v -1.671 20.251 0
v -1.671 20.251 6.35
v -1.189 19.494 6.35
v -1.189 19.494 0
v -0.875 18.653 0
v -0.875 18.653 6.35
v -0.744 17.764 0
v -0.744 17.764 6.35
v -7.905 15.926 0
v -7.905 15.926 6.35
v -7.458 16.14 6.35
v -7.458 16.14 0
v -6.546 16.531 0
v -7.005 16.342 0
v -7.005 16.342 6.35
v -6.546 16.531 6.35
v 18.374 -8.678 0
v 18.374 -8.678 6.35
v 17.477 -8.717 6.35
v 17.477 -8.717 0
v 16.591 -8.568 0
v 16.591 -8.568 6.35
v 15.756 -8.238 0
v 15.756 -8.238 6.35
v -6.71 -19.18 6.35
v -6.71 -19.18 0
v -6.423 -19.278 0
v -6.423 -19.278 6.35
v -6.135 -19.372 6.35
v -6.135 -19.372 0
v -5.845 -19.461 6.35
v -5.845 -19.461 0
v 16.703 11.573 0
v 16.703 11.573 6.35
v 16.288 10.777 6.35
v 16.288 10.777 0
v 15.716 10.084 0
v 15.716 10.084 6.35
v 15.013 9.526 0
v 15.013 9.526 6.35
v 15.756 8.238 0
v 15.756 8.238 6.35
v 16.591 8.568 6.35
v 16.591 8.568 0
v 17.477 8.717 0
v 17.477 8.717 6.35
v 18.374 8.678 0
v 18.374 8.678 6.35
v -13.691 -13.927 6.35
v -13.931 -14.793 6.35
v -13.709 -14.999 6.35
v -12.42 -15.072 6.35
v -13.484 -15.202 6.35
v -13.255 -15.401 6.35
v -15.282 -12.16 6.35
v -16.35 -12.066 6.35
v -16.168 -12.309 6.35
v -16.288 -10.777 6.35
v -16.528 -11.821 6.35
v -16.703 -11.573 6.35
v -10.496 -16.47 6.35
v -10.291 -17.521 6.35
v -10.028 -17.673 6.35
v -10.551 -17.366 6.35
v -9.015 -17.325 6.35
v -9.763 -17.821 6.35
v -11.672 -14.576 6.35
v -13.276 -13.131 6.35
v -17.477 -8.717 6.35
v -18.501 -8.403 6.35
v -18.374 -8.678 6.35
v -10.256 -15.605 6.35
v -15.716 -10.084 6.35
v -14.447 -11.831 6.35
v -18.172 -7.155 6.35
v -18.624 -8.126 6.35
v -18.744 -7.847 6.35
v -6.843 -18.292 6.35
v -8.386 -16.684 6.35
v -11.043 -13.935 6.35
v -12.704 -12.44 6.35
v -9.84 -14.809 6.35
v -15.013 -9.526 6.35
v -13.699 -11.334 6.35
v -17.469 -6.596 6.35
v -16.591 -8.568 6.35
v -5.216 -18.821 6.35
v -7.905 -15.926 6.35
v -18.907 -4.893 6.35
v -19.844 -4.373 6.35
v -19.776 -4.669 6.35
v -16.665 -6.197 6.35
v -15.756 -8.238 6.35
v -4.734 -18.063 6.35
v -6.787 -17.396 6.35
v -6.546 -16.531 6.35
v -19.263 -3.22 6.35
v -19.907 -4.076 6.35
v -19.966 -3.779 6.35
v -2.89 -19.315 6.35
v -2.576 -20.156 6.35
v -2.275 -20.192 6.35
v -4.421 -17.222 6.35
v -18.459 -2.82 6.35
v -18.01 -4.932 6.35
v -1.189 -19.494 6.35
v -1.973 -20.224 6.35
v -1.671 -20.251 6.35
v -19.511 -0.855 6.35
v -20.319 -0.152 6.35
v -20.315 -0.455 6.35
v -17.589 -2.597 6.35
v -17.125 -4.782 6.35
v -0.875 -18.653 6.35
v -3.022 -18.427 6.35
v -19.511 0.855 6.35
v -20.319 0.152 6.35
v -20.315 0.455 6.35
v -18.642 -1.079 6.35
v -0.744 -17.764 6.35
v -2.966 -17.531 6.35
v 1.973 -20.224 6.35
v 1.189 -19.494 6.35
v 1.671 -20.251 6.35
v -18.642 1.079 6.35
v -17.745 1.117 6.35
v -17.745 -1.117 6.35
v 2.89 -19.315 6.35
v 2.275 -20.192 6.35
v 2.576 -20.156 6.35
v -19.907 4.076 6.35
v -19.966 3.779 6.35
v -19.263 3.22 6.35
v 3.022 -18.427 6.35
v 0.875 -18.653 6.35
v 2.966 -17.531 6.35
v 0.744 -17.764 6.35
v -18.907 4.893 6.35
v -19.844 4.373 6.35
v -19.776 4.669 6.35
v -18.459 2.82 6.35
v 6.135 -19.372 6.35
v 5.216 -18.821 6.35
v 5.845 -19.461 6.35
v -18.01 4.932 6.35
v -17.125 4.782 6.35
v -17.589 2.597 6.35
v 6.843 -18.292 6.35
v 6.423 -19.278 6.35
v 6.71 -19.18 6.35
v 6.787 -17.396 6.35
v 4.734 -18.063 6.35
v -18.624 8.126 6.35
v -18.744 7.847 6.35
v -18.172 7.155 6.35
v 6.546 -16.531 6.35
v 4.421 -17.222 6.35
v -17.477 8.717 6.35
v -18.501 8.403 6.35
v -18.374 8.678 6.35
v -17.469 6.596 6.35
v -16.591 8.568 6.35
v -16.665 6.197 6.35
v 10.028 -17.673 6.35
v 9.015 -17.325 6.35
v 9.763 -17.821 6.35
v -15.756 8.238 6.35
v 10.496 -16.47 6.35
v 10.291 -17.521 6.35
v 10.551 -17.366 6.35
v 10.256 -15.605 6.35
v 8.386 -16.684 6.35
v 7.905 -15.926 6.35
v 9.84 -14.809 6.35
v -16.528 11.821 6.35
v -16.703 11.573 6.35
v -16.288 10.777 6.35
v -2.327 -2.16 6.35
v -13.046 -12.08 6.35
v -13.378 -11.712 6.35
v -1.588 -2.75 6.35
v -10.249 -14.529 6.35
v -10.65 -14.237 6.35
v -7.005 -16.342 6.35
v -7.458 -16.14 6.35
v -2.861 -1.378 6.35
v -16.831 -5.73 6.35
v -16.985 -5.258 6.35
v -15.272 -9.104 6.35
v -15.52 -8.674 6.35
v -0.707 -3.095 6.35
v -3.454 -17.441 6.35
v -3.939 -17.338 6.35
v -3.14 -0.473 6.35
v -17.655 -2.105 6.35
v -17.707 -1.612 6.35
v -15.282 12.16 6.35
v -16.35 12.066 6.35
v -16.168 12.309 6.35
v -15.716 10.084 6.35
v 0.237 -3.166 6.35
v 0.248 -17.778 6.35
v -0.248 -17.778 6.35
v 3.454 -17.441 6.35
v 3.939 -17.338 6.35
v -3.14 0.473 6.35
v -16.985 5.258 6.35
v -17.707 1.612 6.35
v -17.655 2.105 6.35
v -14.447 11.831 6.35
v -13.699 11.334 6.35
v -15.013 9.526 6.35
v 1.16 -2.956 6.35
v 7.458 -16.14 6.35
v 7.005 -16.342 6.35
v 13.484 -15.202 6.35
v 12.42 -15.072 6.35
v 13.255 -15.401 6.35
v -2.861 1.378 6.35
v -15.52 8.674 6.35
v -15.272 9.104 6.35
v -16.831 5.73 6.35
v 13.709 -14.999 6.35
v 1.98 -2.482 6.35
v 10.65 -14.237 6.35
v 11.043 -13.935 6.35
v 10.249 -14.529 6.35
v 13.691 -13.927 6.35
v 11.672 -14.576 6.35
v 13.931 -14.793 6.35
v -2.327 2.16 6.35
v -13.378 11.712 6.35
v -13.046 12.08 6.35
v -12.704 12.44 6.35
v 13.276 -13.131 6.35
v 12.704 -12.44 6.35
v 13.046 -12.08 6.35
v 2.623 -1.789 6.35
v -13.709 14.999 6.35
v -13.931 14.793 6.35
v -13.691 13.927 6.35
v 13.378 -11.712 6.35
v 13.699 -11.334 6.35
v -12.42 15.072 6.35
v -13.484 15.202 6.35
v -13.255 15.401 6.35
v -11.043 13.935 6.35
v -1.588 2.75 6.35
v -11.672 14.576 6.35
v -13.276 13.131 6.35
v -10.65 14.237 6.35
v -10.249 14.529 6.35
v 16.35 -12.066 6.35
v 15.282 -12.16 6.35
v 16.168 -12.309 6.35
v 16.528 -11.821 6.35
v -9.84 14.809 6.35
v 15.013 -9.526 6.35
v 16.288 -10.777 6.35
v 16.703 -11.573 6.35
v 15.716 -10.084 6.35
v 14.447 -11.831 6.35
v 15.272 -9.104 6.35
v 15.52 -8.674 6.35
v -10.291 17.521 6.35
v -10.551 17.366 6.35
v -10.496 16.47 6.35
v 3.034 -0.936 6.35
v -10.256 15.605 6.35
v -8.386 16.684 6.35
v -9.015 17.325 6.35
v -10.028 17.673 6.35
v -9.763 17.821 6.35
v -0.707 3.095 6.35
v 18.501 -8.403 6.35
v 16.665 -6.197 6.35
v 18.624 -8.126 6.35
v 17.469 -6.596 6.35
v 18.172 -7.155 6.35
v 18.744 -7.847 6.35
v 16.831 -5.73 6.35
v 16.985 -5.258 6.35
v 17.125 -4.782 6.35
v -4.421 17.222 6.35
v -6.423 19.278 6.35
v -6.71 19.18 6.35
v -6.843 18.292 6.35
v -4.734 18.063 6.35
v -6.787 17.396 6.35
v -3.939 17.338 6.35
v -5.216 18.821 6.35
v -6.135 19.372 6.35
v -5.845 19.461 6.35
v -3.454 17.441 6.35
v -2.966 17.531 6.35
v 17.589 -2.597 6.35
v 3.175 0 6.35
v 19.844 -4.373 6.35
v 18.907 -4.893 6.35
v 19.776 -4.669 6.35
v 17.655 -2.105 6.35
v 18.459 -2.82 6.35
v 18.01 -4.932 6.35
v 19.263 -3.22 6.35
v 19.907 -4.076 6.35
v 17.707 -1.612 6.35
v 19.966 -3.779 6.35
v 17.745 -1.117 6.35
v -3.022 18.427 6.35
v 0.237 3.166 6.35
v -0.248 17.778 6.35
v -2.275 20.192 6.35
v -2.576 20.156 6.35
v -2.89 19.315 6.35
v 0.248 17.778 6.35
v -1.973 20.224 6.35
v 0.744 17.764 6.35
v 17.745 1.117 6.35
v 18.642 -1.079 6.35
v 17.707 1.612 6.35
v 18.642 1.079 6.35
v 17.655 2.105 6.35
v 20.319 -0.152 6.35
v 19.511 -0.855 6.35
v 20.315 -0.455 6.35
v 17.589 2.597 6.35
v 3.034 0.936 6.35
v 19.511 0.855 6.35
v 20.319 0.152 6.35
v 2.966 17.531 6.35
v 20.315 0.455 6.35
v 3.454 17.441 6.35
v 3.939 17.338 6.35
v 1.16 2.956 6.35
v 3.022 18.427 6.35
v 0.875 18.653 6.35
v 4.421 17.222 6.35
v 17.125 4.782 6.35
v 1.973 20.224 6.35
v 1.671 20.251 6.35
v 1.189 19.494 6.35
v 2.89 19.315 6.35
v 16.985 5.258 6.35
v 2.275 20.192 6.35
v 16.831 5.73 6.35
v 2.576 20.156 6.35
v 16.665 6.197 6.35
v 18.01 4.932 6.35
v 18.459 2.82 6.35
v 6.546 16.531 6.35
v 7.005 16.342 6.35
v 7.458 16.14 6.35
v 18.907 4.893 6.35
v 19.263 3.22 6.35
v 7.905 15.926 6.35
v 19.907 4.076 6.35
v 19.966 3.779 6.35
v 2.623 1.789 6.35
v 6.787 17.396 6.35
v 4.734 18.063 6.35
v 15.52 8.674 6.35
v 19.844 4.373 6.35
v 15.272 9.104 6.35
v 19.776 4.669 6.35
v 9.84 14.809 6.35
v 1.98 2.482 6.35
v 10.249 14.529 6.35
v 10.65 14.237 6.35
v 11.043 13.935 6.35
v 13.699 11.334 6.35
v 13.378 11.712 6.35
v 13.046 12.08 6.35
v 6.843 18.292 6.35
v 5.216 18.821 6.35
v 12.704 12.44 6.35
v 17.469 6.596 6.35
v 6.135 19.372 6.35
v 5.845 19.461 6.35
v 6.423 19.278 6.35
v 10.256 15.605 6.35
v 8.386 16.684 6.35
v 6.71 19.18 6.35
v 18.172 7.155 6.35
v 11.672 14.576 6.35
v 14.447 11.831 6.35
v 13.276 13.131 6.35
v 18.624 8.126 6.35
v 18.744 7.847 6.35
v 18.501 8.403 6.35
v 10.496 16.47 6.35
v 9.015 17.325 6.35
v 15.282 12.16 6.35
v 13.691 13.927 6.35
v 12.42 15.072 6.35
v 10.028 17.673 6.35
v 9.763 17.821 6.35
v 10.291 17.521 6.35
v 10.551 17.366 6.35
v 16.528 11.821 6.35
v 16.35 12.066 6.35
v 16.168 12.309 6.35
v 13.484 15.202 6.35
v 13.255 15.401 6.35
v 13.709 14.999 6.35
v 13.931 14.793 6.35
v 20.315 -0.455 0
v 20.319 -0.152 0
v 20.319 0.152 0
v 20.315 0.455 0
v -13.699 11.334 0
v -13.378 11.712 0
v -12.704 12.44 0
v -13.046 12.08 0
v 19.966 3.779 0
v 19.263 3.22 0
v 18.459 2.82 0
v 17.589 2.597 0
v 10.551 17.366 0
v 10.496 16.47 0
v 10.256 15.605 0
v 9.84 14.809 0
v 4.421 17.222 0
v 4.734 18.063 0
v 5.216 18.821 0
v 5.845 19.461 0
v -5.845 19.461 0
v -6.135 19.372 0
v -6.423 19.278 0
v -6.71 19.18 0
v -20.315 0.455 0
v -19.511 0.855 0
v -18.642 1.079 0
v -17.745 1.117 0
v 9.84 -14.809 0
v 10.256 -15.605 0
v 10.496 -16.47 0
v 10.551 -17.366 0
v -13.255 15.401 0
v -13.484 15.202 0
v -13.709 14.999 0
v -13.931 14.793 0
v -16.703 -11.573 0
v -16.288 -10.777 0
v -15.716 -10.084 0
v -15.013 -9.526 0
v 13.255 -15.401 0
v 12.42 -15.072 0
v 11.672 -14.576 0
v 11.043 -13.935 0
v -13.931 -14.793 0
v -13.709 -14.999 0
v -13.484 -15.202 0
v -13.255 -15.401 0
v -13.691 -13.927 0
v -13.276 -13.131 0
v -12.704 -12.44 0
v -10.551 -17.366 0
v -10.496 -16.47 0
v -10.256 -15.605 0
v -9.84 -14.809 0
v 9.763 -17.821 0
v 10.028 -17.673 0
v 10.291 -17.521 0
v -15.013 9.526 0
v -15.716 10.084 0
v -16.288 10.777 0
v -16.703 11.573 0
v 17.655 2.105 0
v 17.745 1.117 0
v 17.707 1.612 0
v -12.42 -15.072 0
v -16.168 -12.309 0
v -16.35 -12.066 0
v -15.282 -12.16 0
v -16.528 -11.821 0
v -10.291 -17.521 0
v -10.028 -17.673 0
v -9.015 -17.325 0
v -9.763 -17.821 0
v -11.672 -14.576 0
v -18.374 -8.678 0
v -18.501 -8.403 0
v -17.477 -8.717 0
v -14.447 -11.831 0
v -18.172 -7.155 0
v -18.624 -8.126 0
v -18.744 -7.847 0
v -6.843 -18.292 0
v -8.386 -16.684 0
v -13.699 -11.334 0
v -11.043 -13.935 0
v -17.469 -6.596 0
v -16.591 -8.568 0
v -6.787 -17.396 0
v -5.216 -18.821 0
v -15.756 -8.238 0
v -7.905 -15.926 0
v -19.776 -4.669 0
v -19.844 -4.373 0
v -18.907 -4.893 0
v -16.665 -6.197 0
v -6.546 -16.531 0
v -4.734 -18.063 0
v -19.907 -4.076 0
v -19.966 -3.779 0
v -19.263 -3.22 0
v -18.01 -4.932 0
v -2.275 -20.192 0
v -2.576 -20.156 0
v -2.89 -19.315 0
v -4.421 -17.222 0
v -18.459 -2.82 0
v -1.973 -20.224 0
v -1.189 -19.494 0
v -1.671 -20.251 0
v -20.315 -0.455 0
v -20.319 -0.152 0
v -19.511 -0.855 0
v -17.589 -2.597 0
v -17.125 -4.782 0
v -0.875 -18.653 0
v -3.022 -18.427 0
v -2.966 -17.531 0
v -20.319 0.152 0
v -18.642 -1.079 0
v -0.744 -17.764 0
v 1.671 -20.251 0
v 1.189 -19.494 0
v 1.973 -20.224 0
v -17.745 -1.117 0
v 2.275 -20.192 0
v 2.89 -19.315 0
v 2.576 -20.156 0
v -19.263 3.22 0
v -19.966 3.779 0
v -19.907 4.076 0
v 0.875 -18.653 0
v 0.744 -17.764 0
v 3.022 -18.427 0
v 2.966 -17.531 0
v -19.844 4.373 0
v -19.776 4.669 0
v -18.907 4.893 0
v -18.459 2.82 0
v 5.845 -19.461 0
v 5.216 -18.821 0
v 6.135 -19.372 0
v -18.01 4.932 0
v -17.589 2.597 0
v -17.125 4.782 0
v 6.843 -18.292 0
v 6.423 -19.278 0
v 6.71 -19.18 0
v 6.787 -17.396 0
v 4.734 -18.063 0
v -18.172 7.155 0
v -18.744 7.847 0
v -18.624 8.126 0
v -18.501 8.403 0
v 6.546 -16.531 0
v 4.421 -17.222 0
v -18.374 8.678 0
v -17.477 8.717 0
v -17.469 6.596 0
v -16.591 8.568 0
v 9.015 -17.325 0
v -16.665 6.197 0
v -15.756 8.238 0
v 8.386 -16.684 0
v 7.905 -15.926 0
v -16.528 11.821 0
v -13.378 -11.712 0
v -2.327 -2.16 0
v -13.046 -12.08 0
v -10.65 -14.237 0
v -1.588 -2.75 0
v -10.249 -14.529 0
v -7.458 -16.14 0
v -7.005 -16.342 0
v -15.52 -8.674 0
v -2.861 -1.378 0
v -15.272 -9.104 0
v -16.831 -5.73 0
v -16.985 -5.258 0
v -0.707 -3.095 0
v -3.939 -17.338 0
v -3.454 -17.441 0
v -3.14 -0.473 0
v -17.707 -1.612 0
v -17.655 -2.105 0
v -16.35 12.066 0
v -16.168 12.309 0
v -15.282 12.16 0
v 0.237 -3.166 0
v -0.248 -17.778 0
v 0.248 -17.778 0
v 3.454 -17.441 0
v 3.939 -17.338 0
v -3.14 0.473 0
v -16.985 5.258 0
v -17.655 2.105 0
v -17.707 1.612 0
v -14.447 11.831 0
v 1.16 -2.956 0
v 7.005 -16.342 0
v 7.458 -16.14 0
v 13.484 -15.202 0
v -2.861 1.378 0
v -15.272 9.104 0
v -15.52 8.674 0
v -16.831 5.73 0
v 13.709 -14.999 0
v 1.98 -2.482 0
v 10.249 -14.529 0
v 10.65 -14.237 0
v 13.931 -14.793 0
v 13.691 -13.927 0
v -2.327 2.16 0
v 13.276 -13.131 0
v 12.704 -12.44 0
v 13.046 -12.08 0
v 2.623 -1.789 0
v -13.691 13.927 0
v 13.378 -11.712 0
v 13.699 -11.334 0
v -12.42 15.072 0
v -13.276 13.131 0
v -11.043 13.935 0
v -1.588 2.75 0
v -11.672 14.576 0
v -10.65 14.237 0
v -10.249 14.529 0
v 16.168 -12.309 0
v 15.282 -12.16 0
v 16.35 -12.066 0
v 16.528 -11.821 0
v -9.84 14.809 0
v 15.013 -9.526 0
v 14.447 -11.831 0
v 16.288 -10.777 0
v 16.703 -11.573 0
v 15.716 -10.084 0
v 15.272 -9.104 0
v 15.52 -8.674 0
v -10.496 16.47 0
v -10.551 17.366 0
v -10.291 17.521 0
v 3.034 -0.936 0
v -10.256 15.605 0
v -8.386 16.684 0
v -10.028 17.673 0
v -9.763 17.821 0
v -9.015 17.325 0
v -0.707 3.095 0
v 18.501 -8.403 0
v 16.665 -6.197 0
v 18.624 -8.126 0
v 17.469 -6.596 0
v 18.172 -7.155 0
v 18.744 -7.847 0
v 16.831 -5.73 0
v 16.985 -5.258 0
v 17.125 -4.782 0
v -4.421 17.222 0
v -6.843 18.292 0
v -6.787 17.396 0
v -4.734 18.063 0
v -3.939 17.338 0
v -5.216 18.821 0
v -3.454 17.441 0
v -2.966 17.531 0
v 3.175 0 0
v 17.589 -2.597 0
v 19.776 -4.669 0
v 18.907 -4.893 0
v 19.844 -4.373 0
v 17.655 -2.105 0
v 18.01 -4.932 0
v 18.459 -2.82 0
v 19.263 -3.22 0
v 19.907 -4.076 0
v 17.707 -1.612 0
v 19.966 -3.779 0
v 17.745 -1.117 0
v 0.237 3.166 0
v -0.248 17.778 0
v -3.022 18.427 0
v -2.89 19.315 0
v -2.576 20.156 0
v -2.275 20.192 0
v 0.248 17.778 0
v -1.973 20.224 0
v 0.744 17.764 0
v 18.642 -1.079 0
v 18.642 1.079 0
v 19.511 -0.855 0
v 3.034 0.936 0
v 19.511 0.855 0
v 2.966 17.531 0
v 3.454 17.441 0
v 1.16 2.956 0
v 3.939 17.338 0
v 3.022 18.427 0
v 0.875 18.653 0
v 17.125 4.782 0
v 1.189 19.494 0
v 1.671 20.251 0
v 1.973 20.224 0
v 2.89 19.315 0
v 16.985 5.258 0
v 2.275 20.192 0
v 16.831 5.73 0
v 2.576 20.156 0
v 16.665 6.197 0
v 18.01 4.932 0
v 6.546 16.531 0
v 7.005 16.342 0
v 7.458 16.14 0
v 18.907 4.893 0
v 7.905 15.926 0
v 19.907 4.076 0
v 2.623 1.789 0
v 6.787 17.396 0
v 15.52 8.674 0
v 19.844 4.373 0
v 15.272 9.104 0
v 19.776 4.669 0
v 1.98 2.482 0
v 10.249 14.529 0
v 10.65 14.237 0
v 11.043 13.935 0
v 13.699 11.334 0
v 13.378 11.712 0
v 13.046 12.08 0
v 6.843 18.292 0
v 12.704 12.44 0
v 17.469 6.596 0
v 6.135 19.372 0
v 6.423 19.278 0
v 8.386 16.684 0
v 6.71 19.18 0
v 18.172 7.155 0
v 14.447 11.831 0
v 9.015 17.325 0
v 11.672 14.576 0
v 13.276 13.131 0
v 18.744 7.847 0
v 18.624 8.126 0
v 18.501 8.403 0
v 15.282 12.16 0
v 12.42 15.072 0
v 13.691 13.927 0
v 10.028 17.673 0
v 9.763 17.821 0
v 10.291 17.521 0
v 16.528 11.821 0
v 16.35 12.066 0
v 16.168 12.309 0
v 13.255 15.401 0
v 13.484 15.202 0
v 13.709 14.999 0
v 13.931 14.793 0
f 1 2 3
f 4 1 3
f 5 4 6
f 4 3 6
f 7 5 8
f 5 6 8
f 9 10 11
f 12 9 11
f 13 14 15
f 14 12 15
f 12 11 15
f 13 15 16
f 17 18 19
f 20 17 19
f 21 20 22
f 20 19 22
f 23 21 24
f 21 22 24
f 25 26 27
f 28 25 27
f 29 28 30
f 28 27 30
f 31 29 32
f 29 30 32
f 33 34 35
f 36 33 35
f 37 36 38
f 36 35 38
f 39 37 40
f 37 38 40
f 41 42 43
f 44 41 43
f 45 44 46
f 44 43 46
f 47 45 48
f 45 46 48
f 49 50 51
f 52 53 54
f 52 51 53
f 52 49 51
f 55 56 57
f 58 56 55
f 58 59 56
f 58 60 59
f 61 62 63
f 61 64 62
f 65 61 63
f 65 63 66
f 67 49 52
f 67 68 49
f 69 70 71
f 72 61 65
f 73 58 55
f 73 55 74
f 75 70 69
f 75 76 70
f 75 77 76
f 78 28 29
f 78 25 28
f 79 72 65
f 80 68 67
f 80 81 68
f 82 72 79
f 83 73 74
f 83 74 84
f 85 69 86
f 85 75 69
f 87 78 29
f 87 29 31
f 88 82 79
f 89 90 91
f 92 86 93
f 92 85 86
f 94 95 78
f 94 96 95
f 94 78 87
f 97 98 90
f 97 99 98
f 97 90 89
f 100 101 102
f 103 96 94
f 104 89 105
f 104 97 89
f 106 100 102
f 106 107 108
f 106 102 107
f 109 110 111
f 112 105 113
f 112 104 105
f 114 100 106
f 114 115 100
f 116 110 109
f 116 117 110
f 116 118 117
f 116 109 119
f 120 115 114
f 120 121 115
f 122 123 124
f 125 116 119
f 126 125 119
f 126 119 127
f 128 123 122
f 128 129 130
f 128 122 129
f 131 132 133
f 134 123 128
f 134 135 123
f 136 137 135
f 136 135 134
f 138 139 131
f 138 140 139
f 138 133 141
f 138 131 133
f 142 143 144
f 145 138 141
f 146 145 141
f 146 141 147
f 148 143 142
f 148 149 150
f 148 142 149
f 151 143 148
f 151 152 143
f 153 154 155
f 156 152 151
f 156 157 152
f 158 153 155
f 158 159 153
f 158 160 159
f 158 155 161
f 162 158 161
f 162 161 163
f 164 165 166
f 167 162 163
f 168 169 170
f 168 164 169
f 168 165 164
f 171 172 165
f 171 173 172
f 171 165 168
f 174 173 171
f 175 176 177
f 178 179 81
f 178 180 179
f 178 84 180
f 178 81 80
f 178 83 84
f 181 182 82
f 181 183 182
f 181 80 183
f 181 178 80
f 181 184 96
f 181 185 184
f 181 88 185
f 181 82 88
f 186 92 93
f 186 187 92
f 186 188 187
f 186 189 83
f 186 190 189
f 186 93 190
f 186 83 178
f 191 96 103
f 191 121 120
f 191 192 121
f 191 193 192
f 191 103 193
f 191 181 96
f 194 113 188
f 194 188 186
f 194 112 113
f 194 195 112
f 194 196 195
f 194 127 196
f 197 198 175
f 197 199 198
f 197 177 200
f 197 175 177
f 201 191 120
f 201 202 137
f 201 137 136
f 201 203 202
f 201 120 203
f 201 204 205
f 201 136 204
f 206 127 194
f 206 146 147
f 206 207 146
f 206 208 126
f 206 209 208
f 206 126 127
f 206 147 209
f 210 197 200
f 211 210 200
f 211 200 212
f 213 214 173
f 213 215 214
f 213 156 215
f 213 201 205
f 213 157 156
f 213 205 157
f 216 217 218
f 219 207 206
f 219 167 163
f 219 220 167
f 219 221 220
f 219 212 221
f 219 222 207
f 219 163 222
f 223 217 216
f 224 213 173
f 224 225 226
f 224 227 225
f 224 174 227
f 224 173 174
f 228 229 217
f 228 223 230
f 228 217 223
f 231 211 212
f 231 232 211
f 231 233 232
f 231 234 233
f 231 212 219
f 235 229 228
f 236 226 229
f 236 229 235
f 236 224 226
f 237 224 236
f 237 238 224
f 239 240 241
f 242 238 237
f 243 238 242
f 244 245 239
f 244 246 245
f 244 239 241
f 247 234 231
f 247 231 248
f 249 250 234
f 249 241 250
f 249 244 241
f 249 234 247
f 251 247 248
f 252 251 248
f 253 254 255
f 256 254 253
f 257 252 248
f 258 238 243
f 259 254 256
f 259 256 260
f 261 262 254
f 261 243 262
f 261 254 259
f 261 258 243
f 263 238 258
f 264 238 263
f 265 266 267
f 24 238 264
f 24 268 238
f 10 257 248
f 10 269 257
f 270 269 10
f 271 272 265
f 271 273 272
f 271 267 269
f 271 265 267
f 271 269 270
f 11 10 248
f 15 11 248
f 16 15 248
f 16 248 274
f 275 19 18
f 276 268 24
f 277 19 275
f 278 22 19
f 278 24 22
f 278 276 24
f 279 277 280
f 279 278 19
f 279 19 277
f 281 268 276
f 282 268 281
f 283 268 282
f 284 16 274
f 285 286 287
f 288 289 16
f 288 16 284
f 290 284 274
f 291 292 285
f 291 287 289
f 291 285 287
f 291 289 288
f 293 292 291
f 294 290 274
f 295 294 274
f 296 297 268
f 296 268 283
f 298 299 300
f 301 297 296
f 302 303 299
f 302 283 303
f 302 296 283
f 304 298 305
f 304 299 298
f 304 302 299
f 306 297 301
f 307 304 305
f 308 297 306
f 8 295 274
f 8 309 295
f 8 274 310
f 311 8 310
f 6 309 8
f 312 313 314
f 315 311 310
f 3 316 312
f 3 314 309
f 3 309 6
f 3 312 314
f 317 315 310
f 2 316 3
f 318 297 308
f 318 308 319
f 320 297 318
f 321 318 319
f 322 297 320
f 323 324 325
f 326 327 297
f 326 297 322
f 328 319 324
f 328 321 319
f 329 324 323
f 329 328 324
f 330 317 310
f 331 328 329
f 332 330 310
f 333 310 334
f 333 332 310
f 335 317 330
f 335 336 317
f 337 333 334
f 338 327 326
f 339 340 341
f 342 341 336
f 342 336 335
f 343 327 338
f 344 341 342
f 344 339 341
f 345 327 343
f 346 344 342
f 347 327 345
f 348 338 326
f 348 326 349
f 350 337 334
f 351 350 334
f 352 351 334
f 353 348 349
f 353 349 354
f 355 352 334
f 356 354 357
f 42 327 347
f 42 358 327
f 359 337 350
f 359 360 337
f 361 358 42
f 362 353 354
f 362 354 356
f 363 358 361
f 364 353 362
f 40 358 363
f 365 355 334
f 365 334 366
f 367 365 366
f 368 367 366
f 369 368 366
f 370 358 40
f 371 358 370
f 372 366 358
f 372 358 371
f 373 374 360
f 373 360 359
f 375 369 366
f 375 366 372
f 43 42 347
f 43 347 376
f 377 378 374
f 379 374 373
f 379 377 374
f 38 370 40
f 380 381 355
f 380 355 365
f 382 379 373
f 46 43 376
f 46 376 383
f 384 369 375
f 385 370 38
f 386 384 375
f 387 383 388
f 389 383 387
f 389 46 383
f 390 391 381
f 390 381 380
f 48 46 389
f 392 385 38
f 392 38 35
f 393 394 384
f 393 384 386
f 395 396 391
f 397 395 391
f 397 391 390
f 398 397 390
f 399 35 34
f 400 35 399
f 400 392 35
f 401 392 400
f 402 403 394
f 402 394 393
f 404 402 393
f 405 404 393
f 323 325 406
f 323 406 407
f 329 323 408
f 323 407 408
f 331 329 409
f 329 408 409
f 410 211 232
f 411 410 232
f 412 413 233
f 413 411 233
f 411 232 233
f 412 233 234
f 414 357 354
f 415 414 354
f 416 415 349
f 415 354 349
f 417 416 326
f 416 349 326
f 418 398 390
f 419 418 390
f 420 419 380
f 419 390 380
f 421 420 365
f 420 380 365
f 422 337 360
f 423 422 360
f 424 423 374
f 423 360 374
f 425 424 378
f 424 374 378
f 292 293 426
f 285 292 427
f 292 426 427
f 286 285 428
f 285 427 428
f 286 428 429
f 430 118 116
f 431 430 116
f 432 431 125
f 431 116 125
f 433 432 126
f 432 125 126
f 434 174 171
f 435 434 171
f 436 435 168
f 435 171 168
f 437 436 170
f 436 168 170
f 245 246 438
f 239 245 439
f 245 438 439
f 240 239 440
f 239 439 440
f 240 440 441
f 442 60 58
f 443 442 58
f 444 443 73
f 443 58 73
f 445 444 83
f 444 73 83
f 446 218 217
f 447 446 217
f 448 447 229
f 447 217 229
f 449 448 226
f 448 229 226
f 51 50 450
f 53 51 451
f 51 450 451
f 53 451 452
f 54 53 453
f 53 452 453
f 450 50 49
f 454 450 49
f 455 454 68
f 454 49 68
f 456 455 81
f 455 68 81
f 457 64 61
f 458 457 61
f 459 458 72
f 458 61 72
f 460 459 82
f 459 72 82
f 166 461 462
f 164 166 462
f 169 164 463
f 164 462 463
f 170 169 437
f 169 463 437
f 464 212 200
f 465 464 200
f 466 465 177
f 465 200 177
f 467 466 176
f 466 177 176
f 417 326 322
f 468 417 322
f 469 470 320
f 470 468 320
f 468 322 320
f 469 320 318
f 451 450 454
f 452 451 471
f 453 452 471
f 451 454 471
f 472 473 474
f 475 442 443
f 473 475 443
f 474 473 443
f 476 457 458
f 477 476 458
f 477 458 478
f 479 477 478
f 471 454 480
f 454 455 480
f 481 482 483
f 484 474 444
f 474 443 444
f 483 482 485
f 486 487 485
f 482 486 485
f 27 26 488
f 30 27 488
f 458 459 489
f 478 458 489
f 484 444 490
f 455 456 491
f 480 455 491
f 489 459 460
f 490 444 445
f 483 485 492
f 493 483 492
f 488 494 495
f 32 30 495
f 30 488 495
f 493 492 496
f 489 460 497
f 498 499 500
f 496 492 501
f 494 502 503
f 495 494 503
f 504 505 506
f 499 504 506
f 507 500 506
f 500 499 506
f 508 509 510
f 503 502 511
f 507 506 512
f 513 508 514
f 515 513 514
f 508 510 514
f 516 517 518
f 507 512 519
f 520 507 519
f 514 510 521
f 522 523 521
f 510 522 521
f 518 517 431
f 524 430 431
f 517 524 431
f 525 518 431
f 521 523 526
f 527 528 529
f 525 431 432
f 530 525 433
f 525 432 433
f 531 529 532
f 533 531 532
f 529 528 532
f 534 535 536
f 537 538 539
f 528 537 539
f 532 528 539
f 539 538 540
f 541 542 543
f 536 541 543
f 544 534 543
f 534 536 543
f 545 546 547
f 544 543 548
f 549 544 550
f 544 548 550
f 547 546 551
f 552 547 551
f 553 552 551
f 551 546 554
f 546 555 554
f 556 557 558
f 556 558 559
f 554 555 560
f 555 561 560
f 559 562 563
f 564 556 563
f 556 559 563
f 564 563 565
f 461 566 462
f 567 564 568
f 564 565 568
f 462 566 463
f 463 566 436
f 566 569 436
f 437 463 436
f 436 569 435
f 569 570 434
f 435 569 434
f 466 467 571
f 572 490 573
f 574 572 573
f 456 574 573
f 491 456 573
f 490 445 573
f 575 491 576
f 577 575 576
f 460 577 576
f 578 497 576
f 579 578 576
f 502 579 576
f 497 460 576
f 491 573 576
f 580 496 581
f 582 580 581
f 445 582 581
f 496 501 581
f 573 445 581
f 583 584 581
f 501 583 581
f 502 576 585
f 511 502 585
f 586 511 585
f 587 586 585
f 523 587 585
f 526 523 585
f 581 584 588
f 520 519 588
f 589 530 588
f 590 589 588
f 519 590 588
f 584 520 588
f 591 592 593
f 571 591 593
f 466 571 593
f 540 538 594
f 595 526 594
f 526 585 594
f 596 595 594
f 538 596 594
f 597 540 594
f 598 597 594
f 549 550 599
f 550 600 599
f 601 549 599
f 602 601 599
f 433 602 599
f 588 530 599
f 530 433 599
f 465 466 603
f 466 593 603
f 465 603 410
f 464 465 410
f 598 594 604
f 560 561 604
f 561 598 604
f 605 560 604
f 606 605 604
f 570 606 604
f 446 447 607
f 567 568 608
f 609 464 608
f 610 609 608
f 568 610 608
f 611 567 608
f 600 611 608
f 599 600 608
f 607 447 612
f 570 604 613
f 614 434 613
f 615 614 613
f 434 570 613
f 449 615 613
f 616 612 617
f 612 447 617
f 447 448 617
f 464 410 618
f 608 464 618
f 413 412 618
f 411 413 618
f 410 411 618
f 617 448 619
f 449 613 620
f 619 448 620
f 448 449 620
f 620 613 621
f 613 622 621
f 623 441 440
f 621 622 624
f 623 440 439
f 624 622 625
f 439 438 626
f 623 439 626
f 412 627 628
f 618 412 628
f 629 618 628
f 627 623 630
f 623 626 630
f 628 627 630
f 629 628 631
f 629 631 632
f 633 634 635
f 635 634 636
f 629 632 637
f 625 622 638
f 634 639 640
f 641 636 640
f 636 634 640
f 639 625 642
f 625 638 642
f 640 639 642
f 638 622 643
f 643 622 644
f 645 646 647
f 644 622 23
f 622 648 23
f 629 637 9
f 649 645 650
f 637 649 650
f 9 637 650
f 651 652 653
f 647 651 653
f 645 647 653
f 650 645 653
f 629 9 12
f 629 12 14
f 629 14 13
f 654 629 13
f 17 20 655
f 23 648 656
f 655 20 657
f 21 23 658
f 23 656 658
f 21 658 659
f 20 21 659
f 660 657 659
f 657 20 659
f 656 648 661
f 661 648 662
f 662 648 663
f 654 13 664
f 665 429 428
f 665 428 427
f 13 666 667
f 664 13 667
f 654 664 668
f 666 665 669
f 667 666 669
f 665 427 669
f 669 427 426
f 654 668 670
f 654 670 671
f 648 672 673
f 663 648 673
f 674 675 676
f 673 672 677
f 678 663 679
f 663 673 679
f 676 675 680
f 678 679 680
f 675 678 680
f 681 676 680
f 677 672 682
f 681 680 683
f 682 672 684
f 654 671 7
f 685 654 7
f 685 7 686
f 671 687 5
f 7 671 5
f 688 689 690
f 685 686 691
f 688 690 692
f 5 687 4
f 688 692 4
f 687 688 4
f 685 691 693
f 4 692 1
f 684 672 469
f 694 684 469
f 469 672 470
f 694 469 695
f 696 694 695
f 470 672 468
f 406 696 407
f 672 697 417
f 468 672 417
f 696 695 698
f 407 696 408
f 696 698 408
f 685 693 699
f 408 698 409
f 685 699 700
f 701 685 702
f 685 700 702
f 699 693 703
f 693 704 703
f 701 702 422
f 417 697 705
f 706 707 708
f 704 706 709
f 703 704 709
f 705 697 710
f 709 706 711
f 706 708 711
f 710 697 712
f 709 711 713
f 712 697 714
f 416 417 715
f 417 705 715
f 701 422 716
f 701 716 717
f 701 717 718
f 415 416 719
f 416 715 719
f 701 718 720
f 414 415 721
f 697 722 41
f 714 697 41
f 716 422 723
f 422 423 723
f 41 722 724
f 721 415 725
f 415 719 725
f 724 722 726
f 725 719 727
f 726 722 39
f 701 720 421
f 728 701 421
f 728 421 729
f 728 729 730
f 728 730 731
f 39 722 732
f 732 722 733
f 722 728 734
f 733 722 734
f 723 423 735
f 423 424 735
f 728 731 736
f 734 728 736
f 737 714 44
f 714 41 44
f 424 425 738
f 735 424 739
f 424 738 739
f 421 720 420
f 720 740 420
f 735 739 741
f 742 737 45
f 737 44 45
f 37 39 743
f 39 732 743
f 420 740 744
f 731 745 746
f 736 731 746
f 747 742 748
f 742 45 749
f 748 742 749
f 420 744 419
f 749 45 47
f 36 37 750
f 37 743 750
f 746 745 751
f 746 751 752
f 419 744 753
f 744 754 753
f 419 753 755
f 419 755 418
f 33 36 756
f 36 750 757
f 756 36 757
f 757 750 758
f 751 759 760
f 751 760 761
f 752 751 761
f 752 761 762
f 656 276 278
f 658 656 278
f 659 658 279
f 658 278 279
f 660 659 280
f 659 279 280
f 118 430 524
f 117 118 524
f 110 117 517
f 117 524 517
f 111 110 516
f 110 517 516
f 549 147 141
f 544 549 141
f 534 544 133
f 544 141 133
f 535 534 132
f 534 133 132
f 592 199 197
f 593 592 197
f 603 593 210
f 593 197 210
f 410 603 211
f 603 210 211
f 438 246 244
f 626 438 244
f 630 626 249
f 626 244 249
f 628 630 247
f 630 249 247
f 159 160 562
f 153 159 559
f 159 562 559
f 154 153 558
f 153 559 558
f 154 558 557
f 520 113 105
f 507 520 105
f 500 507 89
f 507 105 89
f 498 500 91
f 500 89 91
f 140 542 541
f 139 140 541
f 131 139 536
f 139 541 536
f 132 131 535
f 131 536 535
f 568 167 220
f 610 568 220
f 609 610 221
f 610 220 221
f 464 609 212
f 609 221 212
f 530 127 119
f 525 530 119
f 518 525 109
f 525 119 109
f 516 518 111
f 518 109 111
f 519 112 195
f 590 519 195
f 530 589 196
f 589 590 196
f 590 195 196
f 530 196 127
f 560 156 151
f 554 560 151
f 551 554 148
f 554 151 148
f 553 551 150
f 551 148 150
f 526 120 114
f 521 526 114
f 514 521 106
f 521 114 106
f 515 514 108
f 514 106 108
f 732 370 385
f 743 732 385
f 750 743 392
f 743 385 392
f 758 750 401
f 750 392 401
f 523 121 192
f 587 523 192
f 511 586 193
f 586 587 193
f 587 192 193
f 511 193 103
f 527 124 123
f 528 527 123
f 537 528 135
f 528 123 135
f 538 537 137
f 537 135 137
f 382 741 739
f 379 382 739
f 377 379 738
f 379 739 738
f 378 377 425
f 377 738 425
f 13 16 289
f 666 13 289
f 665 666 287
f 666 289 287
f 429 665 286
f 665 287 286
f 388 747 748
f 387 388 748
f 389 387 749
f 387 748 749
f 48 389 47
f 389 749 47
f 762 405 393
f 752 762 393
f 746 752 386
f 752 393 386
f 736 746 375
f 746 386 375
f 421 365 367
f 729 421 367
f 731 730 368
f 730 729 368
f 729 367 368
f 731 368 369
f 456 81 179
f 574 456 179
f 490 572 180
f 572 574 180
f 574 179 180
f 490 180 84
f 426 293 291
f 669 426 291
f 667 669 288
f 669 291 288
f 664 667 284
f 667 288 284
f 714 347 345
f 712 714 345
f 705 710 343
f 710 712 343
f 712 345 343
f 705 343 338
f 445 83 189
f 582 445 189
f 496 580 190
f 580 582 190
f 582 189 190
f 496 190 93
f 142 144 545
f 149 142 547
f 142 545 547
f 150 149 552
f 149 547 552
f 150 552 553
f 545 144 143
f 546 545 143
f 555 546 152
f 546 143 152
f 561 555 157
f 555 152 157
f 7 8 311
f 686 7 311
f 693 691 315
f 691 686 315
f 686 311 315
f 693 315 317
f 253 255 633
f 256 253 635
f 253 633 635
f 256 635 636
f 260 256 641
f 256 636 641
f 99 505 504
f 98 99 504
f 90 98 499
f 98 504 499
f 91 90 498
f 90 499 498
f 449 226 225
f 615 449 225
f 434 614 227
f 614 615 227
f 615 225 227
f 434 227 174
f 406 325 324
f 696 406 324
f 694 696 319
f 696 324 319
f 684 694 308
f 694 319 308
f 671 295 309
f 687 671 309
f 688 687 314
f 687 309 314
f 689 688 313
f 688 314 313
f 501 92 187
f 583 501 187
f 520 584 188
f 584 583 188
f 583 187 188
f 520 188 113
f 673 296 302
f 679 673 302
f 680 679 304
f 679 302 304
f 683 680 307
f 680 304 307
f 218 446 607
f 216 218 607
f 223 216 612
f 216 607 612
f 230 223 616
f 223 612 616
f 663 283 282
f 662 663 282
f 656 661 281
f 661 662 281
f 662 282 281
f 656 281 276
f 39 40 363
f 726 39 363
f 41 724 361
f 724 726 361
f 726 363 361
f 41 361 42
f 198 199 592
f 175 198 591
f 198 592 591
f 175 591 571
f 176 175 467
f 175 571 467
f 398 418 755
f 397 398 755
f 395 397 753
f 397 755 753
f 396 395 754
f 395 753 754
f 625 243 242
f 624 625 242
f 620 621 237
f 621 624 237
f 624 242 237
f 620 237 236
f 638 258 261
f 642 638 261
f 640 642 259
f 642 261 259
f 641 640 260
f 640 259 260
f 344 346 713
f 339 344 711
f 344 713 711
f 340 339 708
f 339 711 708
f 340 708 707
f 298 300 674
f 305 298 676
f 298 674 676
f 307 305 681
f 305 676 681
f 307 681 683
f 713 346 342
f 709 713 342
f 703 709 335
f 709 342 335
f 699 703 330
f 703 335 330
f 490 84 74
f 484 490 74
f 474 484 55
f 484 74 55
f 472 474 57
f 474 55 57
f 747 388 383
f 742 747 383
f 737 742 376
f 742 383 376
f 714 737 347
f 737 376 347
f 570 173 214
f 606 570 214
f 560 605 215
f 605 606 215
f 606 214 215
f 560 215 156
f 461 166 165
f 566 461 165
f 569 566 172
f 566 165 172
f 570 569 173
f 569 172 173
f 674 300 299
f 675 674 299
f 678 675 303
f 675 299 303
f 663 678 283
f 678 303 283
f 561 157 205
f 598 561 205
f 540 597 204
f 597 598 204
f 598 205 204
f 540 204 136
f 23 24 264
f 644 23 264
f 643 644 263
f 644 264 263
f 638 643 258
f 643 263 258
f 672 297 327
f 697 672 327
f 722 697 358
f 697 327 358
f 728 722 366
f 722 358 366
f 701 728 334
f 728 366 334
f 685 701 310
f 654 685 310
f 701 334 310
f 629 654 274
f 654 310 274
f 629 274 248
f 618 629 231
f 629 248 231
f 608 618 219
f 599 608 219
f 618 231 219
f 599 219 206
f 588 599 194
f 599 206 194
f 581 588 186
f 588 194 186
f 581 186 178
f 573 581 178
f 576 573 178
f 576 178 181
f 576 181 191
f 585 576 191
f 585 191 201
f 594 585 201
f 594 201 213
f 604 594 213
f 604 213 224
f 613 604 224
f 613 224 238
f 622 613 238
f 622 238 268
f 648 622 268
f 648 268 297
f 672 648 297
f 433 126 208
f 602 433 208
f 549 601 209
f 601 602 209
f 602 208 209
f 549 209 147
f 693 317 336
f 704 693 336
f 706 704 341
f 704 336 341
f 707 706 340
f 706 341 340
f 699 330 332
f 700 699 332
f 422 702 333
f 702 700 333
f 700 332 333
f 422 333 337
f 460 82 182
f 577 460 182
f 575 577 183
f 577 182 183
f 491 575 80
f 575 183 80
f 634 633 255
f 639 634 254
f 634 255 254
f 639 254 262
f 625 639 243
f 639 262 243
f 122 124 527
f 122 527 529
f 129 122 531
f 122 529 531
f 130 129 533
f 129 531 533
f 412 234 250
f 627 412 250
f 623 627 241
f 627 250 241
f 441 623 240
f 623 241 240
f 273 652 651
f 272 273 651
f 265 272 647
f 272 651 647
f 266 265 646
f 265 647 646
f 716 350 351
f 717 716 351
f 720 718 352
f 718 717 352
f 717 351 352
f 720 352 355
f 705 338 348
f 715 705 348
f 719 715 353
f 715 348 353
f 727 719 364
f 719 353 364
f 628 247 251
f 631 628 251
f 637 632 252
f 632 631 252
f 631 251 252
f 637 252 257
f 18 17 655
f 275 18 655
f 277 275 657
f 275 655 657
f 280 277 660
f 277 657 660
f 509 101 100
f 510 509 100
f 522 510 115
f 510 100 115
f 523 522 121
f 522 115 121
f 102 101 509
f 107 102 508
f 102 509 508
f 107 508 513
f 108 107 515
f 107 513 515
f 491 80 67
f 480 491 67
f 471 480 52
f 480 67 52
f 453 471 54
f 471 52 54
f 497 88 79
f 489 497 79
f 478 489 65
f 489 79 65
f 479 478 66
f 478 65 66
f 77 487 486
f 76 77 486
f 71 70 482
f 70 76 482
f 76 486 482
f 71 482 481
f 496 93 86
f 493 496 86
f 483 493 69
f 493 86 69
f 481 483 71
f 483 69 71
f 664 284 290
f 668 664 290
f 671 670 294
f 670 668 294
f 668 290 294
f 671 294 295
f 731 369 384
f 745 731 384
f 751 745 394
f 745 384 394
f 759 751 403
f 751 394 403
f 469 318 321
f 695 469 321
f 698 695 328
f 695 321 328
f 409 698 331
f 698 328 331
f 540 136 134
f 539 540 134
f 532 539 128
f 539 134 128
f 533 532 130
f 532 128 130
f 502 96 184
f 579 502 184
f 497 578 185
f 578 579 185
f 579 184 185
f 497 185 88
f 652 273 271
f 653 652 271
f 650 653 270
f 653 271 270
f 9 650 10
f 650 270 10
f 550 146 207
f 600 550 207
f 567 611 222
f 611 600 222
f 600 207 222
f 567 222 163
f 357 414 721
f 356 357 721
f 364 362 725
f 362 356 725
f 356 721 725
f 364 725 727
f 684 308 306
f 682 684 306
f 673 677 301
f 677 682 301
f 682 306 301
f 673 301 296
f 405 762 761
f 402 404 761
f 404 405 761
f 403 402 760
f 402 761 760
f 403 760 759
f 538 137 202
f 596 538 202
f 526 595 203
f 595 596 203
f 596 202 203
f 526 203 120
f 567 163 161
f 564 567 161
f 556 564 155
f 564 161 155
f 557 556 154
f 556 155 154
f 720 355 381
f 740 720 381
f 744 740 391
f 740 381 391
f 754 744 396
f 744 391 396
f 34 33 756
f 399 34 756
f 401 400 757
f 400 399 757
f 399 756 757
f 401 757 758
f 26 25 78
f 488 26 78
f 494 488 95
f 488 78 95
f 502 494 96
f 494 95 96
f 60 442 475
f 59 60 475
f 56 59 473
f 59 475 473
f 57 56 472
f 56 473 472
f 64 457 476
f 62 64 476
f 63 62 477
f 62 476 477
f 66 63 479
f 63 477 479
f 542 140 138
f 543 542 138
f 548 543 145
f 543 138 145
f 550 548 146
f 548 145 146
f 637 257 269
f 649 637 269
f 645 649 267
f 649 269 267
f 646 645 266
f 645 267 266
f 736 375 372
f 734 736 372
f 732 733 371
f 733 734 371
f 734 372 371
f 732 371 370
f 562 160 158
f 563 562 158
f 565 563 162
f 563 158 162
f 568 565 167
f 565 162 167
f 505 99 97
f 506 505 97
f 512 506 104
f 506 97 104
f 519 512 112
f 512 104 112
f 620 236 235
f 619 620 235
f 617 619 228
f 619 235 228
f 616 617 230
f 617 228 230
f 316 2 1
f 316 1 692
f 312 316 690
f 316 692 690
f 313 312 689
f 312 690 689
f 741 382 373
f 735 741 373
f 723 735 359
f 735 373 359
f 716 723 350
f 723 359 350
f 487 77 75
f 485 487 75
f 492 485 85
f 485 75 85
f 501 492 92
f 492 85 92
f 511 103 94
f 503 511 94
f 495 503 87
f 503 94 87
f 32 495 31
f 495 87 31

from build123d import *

# Parameters (mm, degrees)
SKETCH1_R           = 20.32
OUTER_CIRCLE_DEPTH  = 6.35
TOOTH_CUT_DEPTH     = 30.430040775
TEETH_PATTERN_COUNT = 30
SKETCH3_R           = 3.175
CUT_EXTRUDE1_DEPTH  = 30.382561533


with BuildPart() as part:
    # Sketch1 → Outer Circle (new body)
    with BuildSketch(Plane.XY):
        Circle(SKETCH1_R)
    extrude(amount=OUTER_CIRCLE_DEPTH)

    # Sketch2 → Tooth Cut (cut, through all)
    with BuildSketch(Plane.XY.offset(6.35)):
        with BuildLine():
            ThreePointArc((-0.743845606, 17.764433391), (0, 17.78), (0.743845606, 17.764433391))
            ThreePointArc((0.743845606, 17.764433391), (1.009950749, 19.081439594), (1.671040922, 20.251173355))
            ThreePointArc((1.671040922, 20.251173355), (0, 20.32), (-1.671040922, 20.251173355))
            ThreePointArc((-1.671040922, 20.251173355), (-1.009950749, 19.081439594), (-0.743845606, 17.764433391))
        make_face()
    tooth_cut = extrude(amount=-TOOTH_CUT_DEPTH, mode=Mode.SUBTRACT)

    # Teeth Pattern: Tooth Cut ×30 about axis
    teeth_pattern_axis = Axis((0, 0, 0), (0, 0, 1))
    for i in range(1, TEETH_PATTERN_COUNT):
        add(tooth_cut.rotate(teeth_pattern_axis, i * 360 / TEETH_PATTERN_COUNT), mode=Mode.SUBTRACT)

    # Sketch3 → Cut-Extrude1 (cut, through all)
    with BuildSketch(Plane.XY.offset(6.35)):
        Circle(SKETCH3_R)
    extrude(amount=-CUT_EXTRUDE1_DEPTH, mode=Mode.SUBTRACT)


solid = part.part
